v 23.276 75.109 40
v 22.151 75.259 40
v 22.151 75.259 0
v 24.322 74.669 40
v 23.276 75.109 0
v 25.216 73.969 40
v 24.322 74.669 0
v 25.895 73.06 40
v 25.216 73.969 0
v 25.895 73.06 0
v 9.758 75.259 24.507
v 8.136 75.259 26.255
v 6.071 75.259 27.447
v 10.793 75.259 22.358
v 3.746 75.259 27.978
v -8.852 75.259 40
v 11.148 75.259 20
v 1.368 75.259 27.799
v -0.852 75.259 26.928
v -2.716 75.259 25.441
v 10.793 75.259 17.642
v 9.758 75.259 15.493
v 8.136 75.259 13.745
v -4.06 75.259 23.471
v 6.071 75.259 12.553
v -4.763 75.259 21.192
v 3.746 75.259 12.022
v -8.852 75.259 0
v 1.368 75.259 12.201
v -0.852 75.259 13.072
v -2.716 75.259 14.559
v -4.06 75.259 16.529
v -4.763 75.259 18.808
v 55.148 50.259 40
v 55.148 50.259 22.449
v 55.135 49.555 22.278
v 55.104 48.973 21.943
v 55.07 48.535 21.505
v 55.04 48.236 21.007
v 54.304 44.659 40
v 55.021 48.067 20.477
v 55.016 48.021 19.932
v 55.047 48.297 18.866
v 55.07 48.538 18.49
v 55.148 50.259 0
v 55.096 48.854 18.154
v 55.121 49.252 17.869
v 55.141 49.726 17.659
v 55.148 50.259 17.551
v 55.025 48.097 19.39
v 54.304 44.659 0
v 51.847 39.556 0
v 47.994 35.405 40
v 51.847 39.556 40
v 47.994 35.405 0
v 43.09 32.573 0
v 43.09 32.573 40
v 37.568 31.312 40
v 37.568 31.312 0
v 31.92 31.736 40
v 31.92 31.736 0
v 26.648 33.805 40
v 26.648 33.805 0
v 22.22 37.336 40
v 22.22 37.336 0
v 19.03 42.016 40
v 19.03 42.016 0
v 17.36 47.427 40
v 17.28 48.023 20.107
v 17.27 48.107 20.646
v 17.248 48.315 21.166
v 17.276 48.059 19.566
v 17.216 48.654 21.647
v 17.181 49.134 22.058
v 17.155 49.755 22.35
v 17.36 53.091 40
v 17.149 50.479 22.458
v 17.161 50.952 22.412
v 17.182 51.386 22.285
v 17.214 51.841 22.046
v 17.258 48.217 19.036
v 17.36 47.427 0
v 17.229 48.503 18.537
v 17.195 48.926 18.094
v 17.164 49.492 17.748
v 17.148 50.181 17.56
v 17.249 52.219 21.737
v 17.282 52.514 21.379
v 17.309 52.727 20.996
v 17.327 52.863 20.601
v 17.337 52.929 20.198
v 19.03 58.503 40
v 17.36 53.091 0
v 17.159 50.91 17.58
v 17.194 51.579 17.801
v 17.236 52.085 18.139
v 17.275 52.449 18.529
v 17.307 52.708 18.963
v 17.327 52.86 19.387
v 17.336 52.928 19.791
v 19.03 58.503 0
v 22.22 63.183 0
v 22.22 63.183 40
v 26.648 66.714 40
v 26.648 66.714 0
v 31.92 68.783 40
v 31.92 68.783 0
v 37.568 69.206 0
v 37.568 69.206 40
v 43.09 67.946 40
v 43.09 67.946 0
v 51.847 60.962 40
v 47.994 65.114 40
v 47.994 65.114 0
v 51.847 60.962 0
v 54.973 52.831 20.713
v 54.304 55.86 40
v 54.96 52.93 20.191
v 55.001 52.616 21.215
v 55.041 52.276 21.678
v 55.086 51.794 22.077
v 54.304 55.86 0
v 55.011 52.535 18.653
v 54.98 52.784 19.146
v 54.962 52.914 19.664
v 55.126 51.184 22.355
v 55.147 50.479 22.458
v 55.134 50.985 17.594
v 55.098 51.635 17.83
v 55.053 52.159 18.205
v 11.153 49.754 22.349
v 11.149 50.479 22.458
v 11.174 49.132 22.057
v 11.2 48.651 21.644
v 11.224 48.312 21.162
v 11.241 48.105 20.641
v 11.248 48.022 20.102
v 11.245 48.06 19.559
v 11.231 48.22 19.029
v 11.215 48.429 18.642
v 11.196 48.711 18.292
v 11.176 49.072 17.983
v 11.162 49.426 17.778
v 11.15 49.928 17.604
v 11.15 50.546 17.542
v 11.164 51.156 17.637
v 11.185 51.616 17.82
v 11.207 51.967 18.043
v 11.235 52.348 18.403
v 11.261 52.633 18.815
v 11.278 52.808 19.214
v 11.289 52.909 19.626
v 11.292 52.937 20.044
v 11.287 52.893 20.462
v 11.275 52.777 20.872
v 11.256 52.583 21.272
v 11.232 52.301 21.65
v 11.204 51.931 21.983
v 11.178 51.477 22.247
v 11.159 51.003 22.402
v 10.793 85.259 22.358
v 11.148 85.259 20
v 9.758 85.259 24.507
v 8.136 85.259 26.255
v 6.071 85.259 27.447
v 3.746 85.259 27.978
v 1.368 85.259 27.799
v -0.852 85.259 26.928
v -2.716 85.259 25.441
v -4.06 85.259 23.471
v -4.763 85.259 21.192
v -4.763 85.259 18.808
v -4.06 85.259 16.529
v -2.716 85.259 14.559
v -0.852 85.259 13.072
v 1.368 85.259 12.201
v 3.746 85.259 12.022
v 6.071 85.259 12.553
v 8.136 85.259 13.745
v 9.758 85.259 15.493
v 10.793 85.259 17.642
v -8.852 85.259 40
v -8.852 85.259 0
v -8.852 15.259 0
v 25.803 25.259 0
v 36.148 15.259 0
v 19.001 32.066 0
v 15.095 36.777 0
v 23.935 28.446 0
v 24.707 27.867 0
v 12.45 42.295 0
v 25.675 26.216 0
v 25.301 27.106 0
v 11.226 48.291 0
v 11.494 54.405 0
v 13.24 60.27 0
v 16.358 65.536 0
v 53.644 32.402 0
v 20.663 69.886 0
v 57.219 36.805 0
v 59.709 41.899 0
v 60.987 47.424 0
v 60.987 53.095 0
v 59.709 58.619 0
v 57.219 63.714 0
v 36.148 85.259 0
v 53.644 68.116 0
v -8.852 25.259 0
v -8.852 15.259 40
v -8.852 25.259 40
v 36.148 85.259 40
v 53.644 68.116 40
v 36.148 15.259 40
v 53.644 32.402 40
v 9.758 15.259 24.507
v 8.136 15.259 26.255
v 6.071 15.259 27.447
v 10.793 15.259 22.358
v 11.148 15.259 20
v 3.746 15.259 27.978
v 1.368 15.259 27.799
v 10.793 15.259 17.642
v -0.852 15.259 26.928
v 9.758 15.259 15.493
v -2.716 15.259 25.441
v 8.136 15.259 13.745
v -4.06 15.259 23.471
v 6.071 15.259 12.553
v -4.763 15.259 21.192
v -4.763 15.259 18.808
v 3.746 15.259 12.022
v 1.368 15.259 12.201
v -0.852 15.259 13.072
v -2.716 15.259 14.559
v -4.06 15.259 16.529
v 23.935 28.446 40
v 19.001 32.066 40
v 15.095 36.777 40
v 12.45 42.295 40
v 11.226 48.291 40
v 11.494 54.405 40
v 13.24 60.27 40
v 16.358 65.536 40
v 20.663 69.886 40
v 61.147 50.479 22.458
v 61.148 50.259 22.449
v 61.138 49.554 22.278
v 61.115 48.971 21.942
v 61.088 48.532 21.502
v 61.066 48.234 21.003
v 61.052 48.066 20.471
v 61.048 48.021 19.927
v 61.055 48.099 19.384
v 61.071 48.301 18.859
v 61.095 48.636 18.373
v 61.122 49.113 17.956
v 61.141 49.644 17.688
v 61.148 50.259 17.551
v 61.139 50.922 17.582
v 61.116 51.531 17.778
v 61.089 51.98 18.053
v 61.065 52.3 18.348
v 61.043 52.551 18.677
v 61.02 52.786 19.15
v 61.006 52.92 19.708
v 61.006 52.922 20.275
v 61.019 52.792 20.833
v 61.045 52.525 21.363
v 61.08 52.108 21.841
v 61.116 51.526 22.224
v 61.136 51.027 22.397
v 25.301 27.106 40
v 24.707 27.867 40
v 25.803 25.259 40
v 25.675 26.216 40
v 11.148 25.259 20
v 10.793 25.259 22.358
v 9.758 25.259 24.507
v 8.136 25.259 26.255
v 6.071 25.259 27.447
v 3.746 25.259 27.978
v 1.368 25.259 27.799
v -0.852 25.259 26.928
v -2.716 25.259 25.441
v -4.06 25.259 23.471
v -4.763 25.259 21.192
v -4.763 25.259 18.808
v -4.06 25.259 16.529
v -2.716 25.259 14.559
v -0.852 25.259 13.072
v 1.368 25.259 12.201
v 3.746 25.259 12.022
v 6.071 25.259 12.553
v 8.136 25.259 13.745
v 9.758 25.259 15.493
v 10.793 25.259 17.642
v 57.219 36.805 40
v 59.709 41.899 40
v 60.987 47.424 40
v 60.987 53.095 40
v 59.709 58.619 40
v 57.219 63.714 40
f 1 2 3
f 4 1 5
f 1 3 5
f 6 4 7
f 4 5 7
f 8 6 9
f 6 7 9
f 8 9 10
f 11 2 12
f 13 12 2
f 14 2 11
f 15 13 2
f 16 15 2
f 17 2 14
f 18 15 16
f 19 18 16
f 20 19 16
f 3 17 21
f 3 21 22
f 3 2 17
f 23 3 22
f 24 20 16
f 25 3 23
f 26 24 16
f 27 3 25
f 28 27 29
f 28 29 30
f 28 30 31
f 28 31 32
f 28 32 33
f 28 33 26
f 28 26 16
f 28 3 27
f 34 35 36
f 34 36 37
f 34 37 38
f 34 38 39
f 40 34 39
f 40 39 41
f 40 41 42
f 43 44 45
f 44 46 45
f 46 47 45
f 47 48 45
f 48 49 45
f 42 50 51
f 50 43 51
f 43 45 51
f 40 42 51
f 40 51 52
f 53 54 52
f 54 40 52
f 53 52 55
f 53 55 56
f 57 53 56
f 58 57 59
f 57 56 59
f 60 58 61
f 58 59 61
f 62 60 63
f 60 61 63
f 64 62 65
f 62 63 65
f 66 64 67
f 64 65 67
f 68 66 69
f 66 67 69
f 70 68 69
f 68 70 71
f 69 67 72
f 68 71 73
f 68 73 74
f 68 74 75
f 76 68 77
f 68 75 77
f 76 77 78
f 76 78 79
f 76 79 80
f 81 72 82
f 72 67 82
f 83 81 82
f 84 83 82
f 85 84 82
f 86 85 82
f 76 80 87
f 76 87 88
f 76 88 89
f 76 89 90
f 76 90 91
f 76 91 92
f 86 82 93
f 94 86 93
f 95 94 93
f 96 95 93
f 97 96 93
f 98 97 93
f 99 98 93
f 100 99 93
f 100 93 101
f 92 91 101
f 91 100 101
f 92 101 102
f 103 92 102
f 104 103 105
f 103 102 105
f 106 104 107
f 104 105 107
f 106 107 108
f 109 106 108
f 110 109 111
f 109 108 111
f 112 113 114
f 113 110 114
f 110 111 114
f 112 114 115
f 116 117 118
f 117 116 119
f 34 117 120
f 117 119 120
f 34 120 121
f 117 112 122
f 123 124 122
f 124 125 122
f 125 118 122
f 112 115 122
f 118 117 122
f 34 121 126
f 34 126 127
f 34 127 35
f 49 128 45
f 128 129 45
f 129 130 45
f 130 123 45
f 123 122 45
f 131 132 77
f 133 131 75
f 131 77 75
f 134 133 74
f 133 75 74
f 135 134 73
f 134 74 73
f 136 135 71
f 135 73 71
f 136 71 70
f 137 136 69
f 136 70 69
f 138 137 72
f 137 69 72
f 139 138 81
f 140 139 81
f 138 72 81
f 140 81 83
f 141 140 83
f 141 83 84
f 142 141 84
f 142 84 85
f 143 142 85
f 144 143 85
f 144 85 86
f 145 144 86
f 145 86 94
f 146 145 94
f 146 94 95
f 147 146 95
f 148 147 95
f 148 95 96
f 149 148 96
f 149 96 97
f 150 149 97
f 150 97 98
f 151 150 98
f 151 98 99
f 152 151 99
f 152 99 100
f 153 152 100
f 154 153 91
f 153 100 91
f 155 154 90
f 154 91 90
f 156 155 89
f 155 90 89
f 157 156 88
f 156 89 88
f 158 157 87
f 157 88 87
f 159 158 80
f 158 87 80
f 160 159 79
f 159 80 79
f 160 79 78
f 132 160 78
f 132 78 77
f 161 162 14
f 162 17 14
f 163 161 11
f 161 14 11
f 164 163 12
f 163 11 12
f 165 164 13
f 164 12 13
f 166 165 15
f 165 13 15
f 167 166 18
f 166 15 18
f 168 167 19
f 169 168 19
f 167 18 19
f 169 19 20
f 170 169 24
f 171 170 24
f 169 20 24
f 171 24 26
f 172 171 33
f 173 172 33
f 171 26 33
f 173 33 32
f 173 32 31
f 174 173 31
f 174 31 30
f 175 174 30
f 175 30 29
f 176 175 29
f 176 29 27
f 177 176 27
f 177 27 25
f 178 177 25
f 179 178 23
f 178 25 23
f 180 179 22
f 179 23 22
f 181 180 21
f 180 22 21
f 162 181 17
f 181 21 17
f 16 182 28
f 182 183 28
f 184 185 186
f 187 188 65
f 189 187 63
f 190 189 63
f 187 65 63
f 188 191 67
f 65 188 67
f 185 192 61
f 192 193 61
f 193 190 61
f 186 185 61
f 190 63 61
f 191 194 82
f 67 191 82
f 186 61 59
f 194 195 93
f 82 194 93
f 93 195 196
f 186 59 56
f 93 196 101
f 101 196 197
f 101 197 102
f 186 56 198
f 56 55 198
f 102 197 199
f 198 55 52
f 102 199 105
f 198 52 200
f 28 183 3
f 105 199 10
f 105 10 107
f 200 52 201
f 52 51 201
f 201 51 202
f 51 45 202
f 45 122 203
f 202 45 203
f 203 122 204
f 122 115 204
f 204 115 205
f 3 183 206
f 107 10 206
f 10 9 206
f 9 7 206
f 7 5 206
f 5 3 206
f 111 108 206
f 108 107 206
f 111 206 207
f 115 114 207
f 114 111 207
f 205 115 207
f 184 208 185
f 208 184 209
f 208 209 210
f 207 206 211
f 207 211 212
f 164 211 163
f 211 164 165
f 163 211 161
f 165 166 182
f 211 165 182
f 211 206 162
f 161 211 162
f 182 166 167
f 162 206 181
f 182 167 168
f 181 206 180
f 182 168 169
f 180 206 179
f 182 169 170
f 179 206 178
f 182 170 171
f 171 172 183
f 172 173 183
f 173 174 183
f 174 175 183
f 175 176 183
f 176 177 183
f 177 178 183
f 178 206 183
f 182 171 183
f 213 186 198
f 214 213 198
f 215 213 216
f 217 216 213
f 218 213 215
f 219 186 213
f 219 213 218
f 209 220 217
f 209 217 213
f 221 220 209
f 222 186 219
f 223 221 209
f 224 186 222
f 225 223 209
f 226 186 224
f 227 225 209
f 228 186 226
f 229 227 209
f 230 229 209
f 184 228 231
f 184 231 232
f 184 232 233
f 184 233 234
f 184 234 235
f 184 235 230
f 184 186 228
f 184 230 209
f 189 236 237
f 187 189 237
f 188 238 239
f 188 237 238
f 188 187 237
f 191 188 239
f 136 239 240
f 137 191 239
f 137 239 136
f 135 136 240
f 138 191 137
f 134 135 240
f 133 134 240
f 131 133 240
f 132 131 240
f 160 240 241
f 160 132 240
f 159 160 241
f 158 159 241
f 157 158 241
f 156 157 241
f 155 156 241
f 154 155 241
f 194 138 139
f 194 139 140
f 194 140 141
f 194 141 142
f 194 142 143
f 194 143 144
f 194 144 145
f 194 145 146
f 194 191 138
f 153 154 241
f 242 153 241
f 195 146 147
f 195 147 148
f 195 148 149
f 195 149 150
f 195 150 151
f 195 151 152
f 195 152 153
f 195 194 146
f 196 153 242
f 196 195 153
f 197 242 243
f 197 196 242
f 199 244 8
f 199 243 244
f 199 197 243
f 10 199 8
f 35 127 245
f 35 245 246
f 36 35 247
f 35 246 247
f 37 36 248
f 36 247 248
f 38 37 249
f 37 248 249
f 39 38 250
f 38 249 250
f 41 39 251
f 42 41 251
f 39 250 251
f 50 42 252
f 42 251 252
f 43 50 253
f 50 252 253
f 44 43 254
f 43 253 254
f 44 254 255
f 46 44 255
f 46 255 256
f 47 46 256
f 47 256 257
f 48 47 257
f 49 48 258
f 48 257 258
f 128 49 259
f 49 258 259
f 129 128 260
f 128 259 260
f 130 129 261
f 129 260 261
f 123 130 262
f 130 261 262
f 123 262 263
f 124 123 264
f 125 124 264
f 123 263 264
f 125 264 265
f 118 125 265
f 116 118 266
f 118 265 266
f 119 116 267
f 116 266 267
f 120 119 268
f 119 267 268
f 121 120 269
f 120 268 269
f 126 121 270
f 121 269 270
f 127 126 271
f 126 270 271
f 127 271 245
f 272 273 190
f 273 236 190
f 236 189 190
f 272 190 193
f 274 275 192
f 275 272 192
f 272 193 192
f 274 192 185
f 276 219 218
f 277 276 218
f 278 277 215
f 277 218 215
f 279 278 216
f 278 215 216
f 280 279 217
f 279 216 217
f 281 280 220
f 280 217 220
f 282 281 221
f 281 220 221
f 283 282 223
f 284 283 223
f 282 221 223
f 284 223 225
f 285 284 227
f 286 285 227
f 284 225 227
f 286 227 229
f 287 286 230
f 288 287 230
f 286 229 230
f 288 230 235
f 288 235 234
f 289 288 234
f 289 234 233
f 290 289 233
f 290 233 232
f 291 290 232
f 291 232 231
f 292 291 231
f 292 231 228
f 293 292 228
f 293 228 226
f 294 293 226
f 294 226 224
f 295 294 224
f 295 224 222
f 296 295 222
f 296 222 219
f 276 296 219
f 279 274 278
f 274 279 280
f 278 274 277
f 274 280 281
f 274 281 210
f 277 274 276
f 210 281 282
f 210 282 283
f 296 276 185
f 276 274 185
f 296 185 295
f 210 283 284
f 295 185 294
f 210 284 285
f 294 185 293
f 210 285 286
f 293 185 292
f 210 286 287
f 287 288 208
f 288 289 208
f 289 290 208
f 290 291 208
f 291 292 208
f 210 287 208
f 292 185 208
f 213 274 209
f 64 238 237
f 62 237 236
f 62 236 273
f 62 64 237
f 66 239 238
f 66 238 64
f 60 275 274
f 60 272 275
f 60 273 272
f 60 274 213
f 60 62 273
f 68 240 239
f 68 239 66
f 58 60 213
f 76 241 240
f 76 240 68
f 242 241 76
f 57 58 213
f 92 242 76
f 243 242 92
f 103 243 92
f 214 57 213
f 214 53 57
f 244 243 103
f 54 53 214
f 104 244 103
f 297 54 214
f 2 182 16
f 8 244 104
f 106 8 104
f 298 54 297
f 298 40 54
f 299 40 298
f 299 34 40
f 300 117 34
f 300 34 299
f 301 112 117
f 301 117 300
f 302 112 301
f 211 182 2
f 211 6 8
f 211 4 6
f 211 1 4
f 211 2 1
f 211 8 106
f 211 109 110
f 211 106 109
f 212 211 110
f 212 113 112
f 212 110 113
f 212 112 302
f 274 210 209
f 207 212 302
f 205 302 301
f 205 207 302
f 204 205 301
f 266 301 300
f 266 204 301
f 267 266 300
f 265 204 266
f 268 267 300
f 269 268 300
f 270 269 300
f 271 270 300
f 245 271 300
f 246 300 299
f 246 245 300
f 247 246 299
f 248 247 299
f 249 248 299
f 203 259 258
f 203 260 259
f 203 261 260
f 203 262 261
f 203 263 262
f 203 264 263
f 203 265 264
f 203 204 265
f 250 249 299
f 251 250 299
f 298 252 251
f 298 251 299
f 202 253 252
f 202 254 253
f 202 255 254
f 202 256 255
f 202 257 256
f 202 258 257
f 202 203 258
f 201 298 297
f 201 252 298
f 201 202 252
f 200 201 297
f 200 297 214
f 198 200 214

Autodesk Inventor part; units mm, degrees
ref_plane "YZ Plane" through (0, 0, 0) normal (1, 0, 0) x (0, 1, 0)
ref_plane "XZ Plane" through (0, 0, 0) normal (0, 1, 0) x (-1, 0, 0)
ref_plane "XY Plane" through (0, 0, 0) normal (0, 0, 1) x (1, 0, 0)
sketch "Sketch1" plane through (0, 0, 0) normal (0, 0, 1) x (1, 0, 0)
  circle A0 centre (36.1481, 50.2593) radius 25
  circle A1 centre (36.1481, 50.2593) radius 19
  line L0 (36.1481, 75.2593) -> (1.1481, 75.2593)
  line L1 (36.1481, 85.2593) -> (-8.8519, 85.2593)
  line L2 (-8.8519, 85.2593) -> (-8.8519, 75.2593)
  line L3 (36.1481, 85.2593) -> (36.1481, 75.2593)
  line L4 (1.1481, 75.2593) -> (-8.8519, 75.2593)
  line L5 (36.1481, 25.2593) -> (1.1481, 25.2593)
  line L6 (36.1481, 15.2593) -> (-8.8519, 15.2593)
  line L7 (1.1481, 25.2593) -> (-8.8519, 25.2593)
  line L8 (36.1481, 15.2593) -> (36.1481, 25.2593)
  line L9 (-8.8519, 15.2593) -> (-8.8519, 25.2593)
  line L10 (36.1481, 85.2593) -> (53.6445, 68.1164)
  line L11 (36.1481, 15.2593) -> (53.6445, 32.4021)
  arc A2 (25.8947, 73.0598) -> (22.1511, 75.2593) centre (22.1511, 70.9735) ccw
  arc A3 (25.8027, 25.2593) -> (23.935, 28.4455) centre (22.1511, 25.2593) ccw
  point P0 (0, 0)
  dimension "d0" = 38
  dimension "d1" = 10
extrude "Extrusion1" add sketch "Sketch1" along normal blind 40
sketch "Sketch2" plane through (-8.8519, 15.2593, 0) normal (0, -1, 0) x (1, 0, 0)
  line L0 (0, 0) -> (0, 40) projected
  line L1 (0, 20) -> (12, 20)
  circle A0 centre (12, 20) radius 8
  point P0 (8.8519, 0)
  dimension "d4" = 12
  dimension "d5" = 16
extrude "Extrusion2" cut sketch "Sketch2" against normal blind 80
sketch "Sketch4" plane through (0, 0, 0) normal (1, 0, 0) x (0, 1, 0)
  line L0 (15.2593, 0) -> (15.2593, 40) projected
  line L1 (15.2593, 20) -> (85.6982, 20)
  point P0 (0, 0)
  point P1 (50.4787, 20)
hole "Hole1" at (0, 50.4787, 20) direction (1, 0, 0) diameter 4.917 depth 85.1 tip angle 118 thread size "M6x1" class "6H" standard "ANSI Metric M Profile"
properties part number "MANCAL_SUPORTE_EIXO" material "SAE 1010/1020"
